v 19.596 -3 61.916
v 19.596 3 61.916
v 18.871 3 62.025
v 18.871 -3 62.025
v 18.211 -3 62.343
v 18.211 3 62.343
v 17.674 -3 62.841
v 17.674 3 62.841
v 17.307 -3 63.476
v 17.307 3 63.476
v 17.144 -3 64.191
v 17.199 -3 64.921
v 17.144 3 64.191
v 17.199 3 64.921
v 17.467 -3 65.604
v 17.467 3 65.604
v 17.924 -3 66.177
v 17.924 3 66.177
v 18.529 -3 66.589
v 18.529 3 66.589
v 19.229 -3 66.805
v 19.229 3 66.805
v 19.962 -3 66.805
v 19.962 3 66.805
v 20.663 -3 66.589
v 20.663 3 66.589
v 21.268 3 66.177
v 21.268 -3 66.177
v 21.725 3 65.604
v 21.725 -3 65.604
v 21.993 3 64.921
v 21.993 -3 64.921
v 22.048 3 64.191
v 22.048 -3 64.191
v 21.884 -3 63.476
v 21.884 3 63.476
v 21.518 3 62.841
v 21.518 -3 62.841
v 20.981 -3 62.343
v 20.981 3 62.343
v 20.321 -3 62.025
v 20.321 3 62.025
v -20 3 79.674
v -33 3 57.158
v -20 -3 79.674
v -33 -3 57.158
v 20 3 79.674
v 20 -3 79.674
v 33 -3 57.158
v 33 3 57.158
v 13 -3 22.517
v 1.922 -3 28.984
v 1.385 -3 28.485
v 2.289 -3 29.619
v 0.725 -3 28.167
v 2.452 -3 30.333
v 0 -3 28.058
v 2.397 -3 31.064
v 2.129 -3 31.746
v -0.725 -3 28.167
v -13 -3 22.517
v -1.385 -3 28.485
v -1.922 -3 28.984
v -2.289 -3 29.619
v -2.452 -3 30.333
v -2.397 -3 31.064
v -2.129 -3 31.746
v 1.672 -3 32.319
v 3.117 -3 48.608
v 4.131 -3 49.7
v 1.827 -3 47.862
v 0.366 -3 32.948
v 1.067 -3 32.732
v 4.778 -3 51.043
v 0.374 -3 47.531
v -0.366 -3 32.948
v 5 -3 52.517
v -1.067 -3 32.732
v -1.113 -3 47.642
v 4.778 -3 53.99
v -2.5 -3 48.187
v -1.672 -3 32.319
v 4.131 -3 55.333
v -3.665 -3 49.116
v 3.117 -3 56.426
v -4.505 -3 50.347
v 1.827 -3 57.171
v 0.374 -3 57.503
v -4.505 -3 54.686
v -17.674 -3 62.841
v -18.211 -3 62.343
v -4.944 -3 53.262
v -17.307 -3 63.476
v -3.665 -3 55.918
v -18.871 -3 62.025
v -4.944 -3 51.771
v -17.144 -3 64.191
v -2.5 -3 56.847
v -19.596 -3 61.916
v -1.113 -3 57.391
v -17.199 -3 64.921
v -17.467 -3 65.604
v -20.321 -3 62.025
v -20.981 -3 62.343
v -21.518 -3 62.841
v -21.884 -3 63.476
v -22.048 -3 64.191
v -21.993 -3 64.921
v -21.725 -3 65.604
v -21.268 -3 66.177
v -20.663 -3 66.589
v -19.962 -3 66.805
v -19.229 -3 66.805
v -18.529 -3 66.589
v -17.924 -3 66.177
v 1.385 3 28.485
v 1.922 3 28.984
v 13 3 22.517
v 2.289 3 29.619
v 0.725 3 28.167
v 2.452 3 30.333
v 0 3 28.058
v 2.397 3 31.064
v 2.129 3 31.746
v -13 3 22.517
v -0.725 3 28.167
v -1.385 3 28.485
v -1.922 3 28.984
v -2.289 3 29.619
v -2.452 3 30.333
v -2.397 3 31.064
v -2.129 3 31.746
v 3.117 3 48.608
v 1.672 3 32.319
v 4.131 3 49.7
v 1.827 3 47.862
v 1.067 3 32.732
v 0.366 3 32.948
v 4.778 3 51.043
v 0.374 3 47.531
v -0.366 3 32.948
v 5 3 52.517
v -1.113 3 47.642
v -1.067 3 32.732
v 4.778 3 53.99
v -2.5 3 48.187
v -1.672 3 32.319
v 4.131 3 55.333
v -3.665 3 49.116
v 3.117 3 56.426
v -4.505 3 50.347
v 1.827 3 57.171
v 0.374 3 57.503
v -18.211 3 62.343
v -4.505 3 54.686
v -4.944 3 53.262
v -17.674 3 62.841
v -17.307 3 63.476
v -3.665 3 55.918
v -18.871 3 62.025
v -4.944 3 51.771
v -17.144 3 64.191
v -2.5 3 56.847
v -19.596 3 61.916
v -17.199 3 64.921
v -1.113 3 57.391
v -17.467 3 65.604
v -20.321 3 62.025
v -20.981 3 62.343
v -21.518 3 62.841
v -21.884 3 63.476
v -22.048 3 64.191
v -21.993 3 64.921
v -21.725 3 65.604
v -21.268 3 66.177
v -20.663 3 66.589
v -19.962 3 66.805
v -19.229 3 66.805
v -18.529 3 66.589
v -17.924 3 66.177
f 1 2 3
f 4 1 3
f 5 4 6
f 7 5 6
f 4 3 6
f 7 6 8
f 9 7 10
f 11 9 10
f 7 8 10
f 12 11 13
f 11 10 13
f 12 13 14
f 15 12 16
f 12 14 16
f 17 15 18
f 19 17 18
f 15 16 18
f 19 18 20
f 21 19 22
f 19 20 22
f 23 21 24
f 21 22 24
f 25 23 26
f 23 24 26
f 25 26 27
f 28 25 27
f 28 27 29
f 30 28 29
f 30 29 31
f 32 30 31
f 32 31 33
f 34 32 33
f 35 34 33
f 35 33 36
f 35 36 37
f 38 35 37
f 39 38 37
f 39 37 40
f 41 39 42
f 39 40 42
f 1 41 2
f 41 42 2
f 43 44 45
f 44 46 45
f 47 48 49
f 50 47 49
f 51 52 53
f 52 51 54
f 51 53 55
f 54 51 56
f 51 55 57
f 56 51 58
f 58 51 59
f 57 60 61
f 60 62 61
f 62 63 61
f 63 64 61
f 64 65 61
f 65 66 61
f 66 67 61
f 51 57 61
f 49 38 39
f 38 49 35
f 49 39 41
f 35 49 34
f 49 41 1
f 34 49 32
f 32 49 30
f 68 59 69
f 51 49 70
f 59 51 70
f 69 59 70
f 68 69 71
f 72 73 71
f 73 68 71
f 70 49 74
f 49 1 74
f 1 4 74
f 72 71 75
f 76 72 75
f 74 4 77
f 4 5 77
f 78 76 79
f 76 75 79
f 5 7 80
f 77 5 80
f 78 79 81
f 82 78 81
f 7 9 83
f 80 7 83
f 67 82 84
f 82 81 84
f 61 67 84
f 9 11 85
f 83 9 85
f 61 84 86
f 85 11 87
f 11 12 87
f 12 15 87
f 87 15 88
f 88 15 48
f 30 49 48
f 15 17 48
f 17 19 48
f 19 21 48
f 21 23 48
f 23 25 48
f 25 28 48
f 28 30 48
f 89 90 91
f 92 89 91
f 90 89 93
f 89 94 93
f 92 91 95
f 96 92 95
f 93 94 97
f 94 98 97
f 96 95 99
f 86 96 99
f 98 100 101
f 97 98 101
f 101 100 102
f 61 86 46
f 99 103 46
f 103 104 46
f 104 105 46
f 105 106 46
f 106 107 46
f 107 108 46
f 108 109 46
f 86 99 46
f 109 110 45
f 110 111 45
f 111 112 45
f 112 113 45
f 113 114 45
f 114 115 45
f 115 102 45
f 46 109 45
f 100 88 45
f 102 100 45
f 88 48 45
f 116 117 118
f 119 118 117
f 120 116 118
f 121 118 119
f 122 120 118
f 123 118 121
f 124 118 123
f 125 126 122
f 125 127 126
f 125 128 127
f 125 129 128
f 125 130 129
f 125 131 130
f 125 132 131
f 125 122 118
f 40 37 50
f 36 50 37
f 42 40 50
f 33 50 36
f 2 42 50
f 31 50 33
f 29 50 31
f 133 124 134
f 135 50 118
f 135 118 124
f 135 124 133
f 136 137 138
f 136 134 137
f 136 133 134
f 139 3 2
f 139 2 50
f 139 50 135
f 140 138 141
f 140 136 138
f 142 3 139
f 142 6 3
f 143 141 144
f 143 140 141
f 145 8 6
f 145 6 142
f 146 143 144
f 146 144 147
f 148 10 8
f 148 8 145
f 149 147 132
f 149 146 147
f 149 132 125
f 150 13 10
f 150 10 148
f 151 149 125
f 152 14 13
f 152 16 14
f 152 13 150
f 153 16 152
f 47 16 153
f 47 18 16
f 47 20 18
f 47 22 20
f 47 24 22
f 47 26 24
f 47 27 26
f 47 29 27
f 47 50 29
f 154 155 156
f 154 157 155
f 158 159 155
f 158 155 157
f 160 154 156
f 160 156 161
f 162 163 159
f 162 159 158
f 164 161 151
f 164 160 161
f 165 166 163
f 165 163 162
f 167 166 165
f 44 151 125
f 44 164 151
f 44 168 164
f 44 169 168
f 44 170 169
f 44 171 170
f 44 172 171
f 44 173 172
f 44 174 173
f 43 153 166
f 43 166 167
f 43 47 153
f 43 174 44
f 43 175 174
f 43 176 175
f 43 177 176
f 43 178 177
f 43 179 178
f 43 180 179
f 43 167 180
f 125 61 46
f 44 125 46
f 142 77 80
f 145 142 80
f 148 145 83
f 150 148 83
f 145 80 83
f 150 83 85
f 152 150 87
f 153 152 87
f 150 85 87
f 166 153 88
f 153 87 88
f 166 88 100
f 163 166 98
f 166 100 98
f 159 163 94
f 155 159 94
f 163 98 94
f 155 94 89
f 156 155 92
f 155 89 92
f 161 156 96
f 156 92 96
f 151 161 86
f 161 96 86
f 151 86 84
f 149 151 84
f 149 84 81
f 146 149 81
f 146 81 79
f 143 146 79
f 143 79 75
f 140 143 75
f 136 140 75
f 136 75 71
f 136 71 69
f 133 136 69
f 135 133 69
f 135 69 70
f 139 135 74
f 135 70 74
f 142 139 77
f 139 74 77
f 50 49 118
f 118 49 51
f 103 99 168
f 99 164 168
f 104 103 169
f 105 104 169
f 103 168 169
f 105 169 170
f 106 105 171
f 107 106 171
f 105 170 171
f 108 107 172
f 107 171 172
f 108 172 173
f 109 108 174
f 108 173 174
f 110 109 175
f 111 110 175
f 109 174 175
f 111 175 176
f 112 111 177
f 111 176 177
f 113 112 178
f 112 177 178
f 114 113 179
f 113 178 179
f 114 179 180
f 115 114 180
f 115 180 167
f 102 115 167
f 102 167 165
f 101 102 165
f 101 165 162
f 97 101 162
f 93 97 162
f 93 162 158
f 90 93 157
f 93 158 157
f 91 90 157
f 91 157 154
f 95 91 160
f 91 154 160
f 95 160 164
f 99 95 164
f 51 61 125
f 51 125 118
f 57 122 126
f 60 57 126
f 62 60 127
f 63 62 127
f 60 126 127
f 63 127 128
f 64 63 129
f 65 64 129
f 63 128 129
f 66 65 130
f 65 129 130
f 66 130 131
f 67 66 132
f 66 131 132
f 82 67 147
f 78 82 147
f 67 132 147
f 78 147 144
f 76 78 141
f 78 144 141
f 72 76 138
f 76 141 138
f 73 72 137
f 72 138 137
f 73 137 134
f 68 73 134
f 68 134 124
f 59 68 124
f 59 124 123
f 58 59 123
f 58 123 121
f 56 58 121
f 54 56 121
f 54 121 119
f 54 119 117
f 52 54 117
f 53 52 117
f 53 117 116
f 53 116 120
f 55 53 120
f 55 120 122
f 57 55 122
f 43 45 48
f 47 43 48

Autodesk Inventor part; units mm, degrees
ref_plane "YZ Plane" through (0, 0, 0) normal (1, 0, 0) x (0, 1, 0)
ref_plane "XZ Plane" through (0, 0, 0) normal (0, 1, 0) x (-1, 0, 0)
ref_plane "XY Plane" through (0, 0, 0) normal (0, 0, 1) x (1, 0, 0)
sketch "Skizze1" plane through (0, 0, 0) normal (0, 1, 0) x (-1, 0, 0)
  line L0 (0, 0) -> (46, 79.6743)
  line L1 (46, 79.6743) -> (-46, 79.6743)
  line L2 (-46, 79.6743) -> (0, 0)
  line L3 (0, 0) -> (0, 79.6743) construction
  line L4 (-46, 79.6743) -> (23, 39.8372) construction
  line L5 (46, 79.6743) -> (-23, 39.8372) construction
  dimension "d0" = 92
extrude "Extrusion1" add sketch "Skizze1" along normal mid plane 6
sketch "Skizze2" plane through (0, -3, 0) normal (0, -1, 0) x (1, 0, 0)
  line L0 (46, 79.6743) -> (-46, 79.6743) projected
  line L1 (-46, 79.6743) -> (0, 0) projected
  line L2 (0, 0) -> (46, 79.6743) projected
  line L3 (0, 0) -> (0, 0) construction
  line L4 (0, 0) -> (0, 79.6743) construction
  line L5 (-46, 79.6743) -> (0, 0) projected
  line L6 (46, 79.6743) -> (-46, 79.6743) projected
  line L7 (-23, 39.8372) -> (46, 79.6743) construction
  line L8 (23, 39.8372) -> (-46, 79.6743) construction
  line L9 (-33, 57.1577) -> (-20, 79.6743)
  point P0 (-33, 57.1577)
  point P1 (-20, 79.6743)
  point P2 (-26.5, 68.416)
  dimension "d31" = 26
extrude "Extrusion6" cut sketch "Skizze2" against normal blind 10 contours L9 L1 L0
mirror "Spiegeln1" about plane through (0, 0, 0) normal (1, 0, 0) of "Extrusion6"
sketch "Skizze7" plane through (0, -3, 0) normal (0, -1, 0) x (1, 0, 0)
  line L0 (0, 0) -> (-33, 57.1577) projected
  line L1 (-13, 22.5167) -> (13, 22.5167)
  line L2 (33, 57.1577) -> (0, 0) projected
  dimension "d38" = 26
extrude "Extrusion7" cut sketch "Skizze7" against normal blind 10
sketch "Skizze3" plane through (0, -3, 0) normal (0, -1, 0) x (1, 0, 0)
  line L0 (46, 79.6743) -> (-46, 79.6743) projected
  line L1 (-13, 22.5167) -> (13, 22.5167) projected
  line L2 (-20, 79.6743) -> (-33, 57.1577) projected
  line L3 (33, 57.1577) -> (20, 79.6743) projected
  point P0 (0, 0)
  point P1 (-19.5959, 64.3743)
  point P2 (19.5959, 64.3743)
  point P3 (0, 30.5167)
  point P4 (33.8756, 72.6743)
  point P5 (-26.5, 68.416)
  dimension "d41" = 8
  dimension "d42" = 8
  dimension "d43" = 8
  dimension "d44" = 15.3
hole "Bohrung1" at (-19.5959, -3, 64.3743) at (19.5959, -3, 64.3743) at (0, -3, 30.5167) direction (0, 1, 0) diameter 4.917 depth 6 thread size "M6x1" class "6H" standard "ISO Metric profile"
sketch "Skizze8" plane through (0, -3, 0) normal (0, -1, 0) x (1, 0, 0)
  circle A0 centre (0, 52.5167) radius 5
  line L0 (-13, 22.5167) -> (13, 22.5167) projected
  point P0 (0, 0)
  point P1 (0, 22.5167)
  dimension "d45" = 30
  dimension "d46" = 10
extrude "Extrusion8" cut sketch "Skizze8" against normal blind 10
equation "\"d42\" = d41"
equation "\"d43\" = d42"
equation "\"d9\" = d8"
equation "\"d8\" = 8"
properties part number "Plate" material "Aluminium 6061"
